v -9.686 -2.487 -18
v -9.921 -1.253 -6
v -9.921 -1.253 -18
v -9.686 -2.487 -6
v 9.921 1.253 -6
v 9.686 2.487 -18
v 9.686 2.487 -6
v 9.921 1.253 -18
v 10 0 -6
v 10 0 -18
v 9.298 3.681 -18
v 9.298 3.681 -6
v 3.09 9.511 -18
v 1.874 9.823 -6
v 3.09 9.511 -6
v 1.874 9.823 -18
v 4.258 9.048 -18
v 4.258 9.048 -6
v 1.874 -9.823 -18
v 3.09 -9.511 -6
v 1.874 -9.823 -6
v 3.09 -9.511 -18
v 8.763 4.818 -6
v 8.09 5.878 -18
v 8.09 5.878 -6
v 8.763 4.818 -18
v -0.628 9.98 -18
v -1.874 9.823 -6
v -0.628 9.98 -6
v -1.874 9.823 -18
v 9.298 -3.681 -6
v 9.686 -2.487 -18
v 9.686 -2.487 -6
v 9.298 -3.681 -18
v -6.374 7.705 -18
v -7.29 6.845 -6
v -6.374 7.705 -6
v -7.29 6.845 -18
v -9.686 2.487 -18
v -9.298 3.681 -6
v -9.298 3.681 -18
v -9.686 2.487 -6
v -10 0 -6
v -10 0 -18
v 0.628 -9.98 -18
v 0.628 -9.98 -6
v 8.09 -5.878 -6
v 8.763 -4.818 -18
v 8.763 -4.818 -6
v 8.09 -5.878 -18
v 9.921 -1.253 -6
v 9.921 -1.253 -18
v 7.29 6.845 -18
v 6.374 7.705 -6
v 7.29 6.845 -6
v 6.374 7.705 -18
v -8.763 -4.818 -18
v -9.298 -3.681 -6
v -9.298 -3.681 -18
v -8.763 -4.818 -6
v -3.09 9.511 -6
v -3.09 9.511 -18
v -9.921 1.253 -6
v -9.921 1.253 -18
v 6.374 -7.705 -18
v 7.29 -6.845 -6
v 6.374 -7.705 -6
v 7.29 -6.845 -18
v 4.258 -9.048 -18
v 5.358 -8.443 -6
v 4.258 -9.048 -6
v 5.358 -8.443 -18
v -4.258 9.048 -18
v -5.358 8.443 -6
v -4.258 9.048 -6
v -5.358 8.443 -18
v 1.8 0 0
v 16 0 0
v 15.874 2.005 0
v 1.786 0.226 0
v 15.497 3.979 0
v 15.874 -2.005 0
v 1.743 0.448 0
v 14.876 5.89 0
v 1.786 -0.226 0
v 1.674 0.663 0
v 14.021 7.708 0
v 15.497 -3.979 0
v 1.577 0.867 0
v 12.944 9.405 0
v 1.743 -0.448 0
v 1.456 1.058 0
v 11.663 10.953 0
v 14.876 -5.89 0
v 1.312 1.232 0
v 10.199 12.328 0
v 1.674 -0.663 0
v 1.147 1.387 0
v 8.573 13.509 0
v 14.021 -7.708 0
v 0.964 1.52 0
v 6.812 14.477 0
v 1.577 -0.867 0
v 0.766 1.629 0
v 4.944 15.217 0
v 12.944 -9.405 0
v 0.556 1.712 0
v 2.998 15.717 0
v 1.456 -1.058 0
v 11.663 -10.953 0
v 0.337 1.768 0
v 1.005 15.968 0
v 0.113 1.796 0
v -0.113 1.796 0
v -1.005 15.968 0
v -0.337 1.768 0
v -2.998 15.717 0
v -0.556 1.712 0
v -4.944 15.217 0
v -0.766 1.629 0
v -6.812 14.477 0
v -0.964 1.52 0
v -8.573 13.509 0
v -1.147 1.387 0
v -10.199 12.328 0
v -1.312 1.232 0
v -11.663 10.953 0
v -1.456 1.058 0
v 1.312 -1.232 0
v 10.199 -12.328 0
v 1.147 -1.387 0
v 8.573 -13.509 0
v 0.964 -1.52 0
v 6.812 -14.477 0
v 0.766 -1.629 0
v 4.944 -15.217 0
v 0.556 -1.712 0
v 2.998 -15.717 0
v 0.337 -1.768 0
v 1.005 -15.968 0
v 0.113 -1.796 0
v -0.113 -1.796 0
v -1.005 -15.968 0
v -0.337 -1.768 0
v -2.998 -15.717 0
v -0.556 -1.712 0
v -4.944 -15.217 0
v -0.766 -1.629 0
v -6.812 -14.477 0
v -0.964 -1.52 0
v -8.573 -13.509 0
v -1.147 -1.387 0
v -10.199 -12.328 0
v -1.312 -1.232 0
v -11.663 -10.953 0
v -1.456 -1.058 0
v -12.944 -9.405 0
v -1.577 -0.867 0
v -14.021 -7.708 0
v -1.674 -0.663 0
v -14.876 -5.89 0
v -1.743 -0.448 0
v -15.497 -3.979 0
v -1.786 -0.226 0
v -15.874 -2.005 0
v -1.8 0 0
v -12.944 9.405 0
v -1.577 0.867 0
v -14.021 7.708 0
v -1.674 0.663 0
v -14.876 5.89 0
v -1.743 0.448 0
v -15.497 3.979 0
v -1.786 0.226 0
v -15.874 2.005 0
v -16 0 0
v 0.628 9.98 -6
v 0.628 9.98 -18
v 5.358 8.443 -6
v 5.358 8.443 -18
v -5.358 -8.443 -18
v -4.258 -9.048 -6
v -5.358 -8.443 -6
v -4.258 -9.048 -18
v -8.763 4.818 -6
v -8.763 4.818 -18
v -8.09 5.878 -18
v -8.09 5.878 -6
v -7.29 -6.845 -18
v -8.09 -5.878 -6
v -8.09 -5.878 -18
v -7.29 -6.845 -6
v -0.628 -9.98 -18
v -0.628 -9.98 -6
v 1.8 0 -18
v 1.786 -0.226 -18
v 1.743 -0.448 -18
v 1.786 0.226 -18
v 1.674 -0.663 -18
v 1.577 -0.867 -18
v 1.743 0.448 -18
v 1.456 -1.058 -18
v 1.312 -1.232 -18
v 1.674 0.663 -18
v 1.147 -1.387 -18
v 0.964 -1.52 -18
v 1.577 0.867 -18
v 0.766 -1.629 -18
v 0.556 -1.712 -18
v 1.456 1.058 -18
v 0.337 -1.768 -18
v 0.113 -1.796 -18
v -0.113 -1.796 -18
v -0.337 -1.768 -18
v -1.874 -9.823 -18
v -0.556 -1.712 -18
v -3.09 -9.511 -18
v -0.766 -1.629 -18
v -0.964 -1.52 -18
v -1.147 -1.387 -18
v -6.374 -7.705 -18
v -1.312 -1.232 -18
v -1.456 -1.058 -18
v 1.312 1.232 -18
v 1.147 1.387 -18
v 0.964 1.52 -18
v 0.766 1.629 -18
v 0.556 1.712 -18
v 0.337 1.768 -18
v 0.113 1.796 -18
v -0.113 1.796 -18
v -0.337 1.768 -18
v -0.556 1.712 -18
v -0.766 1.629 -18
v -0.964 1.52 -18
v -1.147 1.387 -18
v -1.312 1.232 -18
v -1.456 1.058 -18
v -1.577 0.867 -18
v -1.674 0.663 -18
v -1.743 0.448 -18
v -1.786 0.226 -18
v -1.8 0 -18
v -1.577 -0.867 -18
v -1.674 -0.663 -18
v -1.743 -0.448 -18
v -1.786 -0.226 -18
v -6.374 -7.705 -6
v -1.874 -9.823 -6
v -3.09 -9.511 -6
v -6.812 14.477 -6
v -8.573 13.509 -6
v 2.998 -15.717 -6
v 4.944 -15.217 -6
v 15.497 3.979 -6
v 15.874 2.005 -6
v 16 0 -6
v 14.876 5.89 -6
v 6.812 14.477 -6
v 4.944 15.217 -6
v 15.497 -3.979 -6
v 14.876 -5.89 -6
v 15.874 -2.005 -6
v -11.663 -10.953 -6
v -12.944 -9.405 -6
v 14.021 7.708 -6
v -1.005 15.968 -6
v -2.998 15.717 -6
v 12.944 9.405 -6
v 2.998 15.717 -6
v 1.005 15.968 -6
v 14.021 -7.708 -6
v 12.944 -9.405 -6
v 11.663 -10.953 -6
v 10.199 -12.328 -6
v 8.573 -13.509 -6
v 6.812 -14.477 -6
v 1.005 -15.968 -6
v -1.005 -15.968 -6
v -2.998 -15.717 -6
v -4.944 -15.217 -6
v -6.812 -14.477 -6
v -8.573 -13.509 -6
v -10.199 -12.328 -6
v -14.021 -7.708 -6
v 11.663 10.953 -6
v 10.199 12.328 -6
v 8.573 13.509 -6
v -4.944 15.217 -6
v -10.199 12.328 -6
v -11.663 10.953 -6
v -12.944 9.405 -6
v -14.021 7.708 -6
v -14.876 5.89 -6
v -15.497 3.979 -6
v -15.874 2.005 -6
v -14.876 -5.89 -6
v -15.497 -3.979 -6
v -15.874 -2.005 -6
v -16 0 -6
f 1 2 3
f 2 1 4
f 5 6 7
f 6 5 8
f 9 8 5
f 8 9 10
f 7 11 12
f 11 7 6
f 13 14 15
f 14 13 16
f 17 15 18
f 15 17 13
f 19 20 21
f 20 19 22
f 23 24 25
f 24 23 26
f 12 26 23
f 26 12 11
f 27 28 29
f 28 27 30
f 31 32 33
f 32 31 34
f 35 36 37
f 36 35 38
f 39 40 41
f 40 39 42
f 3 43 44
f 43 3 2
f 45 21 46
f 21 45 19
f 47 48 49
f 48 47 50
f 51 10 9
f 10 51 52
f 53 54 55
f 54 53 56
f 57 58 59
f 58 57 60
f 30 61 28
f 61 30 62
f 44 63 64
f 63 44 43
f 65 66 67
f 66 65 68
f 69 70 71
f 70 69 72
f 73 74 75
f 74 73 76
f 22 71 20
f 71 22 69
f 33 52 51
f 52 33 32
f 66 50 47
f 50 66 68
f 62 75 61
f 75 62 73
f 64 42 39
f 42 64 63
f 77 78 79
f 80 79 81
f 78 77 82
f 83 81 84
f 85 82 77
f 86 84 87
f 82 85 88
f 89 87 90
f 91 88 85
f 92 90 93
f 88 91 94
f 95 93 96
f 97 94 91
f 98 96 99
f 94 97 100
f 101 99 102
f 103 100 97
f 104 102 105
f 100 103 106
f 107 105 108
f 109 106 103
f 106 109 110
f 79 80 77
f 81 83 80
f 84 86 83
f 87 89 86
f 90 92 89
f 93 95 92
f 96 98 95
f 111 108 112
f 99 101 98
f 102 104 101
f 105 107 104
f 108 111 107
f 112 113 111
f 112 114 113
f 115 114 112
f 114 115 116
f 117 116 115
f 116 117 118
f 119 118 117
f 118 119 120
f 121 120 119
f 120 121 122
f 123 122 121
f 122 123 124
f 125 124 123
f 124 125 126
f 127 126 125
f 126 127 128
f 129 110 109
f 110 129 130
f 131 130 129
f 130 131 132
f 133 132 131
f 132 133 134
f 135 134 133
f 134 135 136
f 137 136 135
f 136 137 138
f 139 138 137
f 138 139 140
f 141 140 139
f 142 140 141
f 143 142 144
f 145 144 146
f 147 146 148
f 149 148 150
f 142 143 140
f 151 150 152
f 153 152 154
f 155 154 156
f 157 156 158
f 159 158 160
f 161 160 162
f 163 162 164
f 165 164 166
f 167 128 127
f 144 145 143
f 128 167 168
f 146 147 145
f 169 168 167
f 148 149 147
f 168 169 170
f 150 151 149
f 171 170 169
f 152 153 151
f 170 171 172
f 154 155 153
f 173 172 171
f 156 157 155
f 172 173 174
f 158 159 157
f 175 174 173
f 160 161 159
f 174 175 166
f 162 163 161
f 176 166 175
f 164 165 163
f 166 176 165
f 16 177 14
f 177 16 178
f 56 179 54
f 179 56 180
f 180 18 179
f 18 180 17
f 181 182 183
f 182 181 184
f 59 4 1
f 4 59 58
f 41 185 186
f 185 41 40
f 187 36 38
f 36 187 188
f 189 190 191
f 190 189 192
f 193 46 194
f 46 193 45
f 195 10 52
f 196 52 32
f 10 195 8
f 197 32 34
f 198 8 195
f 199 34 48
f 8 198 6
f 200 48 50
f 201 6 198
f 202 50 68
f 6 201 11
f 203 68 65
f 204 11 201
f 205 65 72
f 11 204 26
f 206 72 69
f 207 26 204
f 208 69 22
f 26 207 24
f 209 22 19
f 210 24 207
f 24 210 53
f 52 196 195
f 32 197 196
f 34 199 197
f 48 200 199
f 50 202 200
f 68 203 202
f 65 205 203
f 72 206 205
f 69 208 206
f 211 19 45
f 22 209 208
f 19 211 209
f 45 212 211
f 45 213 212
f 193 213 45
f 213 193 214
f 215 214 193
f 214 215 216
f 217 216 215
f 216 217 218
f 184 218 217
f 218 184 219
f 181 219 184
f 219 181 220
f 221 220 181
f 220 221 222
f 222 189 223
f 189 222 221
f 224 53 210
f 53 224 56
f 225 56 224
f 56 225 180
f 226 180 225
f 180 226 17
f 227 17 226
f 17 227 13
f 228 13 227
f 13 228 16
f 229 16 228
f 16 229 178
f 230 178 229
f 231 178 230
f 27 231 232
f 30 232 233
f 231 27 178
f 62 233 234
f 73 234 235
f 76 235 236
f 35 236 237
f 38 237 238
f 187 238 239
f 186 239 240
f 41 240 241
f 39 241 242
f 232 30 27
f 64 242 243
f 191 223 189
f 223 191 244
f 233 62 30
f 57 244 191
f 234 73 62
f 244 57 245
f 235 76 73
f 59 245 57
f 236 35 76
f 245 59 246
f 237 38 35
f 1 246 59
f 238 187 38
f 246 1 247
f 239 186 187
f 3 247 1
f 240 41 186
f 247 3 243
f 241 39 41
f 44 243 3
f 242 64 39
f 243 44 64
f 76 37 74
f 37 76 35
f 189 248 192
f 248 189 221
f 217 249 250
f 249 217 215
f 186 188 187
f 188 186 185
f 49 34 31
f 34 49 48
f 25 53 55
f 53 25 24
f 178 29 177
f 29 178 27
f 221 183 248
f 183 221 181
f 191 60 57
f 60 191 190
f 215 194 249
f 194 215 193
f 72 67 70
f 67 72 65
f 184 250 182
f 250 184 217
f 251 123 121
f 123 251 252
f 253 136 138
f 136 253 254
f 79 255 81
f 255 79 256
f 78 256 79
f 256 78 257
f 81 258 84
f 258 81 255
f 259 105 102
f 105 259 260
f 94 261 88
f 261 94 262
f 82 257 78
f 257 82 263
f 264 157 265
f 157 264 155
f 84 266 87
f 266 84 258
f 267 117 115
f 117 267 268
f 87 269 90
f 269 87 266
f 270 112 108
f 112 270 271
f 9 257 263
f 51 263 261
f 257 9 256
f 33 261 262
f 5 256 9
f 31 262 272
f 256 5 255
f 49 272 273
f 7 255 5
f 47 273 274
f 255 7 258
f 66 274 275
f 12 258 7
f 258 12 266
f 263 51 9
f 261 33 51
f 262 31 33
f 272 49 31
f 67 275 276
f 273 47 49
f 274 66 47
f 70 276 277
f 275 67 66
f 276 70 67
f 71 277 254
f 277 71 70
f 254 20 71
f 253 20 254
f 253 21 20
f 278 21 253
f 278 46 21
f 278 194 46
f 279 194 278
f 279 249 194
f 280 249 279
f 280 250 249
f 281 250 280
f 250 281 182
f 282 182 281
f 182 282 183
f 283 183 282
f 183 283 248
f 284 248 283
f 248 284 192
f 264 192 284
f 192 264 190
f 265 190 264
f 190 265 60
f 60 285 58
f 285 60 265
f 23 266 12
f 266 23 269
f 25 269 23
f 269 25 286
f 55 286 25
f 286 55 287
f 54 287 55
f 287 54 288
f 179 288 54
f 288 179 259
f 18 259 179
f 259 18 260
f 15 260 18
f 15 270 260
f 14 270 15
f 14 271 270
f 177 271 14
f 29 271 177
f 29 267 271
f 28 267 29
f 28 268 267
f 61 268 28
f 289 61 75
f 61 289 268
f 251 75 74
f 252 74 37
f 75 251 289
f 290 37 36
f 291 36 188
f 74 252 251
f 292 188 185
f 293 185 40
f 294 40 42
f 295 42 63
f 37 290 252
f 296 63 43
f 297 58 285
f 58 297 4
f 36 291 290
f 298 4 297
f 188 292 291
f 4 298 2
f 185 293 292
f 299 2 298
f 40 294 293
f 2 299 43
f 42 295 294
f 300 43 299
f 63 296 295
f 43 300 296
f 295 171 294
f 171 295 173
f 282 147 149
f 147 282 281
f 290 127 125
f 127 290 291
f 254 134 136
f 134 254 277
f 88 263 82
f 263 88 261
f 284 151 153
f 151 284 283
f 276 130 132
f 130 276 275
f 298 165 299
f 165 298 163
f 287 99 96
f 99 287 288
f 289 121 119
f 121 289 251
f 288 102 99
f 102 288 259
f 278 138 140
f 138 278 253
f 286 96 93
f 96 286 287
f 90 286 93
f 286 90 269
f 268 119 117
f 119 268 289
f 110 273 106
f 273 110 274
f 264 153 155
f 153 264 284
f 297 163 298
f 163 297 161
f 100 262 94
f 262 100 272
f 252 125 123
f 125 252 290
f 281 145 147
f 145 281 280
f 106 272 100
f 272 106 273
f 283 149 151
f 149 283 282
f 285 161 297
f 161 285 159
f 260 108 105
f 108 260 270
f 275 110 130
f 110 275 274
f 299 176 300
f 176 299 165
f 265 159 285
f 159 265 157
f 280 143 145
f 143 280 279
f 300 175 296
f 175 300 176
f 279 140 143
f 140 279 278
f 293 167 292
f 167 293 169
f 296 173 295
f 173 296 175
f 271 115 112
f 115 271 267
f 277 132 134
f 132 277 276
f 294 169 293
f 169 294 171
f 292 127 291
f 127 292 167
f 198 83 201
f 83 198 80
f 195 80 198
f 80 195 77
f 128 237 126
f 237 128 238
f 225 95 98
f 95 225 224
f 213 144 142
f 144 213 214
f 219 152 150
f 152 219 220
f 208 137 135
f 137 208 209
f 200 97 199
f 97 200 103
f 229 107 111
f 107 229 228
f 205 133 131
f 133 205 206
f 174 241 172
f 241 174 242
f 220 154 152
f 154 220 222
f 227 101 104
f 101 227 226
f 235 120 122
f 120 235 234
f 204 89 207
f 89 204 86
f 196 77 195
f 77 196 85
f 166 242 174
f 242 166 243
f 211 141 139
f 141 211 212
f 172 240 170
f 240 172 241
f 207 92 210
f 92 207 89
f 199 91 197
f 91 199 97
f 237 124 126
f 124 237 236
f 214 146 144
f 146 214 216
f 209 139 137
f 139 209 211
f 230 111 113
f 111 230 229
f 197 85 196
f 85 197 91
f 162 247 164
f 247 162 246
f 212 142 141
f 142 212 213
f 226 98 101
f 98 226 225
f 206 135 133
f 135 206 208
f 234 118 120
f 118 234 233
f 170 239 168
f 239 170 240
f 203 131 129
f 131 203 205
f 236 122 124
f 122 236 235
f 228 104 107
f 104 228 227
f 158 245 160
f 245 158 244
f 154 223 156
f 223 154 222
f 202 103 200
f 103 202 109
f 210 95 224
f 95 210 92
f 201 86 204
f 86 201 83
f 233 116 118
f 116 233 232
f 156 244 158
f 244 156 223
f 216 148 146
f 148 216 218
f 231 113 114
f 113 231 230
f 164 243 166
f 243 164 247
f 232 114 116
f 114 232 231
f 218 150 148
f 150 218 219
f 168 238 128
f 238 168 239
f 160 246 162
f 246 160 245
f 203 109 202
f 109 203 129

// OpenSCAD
$fn = 50;


difference() {
	union() {
		translate(v = [0, 0, -18.0000000000]) {
			cylinder(h = 18, r = 10.0000000000);
		}
		translate(v = [0, 0, -6.0000000000]) {
			cylinder(h = 6, r = 16.0000000000);
		}
	}
	union() {
		#translate(v = [0, 0, -18]) {
			cylinder(h = 18, r = 1.8000000000);
		}
	}
}
